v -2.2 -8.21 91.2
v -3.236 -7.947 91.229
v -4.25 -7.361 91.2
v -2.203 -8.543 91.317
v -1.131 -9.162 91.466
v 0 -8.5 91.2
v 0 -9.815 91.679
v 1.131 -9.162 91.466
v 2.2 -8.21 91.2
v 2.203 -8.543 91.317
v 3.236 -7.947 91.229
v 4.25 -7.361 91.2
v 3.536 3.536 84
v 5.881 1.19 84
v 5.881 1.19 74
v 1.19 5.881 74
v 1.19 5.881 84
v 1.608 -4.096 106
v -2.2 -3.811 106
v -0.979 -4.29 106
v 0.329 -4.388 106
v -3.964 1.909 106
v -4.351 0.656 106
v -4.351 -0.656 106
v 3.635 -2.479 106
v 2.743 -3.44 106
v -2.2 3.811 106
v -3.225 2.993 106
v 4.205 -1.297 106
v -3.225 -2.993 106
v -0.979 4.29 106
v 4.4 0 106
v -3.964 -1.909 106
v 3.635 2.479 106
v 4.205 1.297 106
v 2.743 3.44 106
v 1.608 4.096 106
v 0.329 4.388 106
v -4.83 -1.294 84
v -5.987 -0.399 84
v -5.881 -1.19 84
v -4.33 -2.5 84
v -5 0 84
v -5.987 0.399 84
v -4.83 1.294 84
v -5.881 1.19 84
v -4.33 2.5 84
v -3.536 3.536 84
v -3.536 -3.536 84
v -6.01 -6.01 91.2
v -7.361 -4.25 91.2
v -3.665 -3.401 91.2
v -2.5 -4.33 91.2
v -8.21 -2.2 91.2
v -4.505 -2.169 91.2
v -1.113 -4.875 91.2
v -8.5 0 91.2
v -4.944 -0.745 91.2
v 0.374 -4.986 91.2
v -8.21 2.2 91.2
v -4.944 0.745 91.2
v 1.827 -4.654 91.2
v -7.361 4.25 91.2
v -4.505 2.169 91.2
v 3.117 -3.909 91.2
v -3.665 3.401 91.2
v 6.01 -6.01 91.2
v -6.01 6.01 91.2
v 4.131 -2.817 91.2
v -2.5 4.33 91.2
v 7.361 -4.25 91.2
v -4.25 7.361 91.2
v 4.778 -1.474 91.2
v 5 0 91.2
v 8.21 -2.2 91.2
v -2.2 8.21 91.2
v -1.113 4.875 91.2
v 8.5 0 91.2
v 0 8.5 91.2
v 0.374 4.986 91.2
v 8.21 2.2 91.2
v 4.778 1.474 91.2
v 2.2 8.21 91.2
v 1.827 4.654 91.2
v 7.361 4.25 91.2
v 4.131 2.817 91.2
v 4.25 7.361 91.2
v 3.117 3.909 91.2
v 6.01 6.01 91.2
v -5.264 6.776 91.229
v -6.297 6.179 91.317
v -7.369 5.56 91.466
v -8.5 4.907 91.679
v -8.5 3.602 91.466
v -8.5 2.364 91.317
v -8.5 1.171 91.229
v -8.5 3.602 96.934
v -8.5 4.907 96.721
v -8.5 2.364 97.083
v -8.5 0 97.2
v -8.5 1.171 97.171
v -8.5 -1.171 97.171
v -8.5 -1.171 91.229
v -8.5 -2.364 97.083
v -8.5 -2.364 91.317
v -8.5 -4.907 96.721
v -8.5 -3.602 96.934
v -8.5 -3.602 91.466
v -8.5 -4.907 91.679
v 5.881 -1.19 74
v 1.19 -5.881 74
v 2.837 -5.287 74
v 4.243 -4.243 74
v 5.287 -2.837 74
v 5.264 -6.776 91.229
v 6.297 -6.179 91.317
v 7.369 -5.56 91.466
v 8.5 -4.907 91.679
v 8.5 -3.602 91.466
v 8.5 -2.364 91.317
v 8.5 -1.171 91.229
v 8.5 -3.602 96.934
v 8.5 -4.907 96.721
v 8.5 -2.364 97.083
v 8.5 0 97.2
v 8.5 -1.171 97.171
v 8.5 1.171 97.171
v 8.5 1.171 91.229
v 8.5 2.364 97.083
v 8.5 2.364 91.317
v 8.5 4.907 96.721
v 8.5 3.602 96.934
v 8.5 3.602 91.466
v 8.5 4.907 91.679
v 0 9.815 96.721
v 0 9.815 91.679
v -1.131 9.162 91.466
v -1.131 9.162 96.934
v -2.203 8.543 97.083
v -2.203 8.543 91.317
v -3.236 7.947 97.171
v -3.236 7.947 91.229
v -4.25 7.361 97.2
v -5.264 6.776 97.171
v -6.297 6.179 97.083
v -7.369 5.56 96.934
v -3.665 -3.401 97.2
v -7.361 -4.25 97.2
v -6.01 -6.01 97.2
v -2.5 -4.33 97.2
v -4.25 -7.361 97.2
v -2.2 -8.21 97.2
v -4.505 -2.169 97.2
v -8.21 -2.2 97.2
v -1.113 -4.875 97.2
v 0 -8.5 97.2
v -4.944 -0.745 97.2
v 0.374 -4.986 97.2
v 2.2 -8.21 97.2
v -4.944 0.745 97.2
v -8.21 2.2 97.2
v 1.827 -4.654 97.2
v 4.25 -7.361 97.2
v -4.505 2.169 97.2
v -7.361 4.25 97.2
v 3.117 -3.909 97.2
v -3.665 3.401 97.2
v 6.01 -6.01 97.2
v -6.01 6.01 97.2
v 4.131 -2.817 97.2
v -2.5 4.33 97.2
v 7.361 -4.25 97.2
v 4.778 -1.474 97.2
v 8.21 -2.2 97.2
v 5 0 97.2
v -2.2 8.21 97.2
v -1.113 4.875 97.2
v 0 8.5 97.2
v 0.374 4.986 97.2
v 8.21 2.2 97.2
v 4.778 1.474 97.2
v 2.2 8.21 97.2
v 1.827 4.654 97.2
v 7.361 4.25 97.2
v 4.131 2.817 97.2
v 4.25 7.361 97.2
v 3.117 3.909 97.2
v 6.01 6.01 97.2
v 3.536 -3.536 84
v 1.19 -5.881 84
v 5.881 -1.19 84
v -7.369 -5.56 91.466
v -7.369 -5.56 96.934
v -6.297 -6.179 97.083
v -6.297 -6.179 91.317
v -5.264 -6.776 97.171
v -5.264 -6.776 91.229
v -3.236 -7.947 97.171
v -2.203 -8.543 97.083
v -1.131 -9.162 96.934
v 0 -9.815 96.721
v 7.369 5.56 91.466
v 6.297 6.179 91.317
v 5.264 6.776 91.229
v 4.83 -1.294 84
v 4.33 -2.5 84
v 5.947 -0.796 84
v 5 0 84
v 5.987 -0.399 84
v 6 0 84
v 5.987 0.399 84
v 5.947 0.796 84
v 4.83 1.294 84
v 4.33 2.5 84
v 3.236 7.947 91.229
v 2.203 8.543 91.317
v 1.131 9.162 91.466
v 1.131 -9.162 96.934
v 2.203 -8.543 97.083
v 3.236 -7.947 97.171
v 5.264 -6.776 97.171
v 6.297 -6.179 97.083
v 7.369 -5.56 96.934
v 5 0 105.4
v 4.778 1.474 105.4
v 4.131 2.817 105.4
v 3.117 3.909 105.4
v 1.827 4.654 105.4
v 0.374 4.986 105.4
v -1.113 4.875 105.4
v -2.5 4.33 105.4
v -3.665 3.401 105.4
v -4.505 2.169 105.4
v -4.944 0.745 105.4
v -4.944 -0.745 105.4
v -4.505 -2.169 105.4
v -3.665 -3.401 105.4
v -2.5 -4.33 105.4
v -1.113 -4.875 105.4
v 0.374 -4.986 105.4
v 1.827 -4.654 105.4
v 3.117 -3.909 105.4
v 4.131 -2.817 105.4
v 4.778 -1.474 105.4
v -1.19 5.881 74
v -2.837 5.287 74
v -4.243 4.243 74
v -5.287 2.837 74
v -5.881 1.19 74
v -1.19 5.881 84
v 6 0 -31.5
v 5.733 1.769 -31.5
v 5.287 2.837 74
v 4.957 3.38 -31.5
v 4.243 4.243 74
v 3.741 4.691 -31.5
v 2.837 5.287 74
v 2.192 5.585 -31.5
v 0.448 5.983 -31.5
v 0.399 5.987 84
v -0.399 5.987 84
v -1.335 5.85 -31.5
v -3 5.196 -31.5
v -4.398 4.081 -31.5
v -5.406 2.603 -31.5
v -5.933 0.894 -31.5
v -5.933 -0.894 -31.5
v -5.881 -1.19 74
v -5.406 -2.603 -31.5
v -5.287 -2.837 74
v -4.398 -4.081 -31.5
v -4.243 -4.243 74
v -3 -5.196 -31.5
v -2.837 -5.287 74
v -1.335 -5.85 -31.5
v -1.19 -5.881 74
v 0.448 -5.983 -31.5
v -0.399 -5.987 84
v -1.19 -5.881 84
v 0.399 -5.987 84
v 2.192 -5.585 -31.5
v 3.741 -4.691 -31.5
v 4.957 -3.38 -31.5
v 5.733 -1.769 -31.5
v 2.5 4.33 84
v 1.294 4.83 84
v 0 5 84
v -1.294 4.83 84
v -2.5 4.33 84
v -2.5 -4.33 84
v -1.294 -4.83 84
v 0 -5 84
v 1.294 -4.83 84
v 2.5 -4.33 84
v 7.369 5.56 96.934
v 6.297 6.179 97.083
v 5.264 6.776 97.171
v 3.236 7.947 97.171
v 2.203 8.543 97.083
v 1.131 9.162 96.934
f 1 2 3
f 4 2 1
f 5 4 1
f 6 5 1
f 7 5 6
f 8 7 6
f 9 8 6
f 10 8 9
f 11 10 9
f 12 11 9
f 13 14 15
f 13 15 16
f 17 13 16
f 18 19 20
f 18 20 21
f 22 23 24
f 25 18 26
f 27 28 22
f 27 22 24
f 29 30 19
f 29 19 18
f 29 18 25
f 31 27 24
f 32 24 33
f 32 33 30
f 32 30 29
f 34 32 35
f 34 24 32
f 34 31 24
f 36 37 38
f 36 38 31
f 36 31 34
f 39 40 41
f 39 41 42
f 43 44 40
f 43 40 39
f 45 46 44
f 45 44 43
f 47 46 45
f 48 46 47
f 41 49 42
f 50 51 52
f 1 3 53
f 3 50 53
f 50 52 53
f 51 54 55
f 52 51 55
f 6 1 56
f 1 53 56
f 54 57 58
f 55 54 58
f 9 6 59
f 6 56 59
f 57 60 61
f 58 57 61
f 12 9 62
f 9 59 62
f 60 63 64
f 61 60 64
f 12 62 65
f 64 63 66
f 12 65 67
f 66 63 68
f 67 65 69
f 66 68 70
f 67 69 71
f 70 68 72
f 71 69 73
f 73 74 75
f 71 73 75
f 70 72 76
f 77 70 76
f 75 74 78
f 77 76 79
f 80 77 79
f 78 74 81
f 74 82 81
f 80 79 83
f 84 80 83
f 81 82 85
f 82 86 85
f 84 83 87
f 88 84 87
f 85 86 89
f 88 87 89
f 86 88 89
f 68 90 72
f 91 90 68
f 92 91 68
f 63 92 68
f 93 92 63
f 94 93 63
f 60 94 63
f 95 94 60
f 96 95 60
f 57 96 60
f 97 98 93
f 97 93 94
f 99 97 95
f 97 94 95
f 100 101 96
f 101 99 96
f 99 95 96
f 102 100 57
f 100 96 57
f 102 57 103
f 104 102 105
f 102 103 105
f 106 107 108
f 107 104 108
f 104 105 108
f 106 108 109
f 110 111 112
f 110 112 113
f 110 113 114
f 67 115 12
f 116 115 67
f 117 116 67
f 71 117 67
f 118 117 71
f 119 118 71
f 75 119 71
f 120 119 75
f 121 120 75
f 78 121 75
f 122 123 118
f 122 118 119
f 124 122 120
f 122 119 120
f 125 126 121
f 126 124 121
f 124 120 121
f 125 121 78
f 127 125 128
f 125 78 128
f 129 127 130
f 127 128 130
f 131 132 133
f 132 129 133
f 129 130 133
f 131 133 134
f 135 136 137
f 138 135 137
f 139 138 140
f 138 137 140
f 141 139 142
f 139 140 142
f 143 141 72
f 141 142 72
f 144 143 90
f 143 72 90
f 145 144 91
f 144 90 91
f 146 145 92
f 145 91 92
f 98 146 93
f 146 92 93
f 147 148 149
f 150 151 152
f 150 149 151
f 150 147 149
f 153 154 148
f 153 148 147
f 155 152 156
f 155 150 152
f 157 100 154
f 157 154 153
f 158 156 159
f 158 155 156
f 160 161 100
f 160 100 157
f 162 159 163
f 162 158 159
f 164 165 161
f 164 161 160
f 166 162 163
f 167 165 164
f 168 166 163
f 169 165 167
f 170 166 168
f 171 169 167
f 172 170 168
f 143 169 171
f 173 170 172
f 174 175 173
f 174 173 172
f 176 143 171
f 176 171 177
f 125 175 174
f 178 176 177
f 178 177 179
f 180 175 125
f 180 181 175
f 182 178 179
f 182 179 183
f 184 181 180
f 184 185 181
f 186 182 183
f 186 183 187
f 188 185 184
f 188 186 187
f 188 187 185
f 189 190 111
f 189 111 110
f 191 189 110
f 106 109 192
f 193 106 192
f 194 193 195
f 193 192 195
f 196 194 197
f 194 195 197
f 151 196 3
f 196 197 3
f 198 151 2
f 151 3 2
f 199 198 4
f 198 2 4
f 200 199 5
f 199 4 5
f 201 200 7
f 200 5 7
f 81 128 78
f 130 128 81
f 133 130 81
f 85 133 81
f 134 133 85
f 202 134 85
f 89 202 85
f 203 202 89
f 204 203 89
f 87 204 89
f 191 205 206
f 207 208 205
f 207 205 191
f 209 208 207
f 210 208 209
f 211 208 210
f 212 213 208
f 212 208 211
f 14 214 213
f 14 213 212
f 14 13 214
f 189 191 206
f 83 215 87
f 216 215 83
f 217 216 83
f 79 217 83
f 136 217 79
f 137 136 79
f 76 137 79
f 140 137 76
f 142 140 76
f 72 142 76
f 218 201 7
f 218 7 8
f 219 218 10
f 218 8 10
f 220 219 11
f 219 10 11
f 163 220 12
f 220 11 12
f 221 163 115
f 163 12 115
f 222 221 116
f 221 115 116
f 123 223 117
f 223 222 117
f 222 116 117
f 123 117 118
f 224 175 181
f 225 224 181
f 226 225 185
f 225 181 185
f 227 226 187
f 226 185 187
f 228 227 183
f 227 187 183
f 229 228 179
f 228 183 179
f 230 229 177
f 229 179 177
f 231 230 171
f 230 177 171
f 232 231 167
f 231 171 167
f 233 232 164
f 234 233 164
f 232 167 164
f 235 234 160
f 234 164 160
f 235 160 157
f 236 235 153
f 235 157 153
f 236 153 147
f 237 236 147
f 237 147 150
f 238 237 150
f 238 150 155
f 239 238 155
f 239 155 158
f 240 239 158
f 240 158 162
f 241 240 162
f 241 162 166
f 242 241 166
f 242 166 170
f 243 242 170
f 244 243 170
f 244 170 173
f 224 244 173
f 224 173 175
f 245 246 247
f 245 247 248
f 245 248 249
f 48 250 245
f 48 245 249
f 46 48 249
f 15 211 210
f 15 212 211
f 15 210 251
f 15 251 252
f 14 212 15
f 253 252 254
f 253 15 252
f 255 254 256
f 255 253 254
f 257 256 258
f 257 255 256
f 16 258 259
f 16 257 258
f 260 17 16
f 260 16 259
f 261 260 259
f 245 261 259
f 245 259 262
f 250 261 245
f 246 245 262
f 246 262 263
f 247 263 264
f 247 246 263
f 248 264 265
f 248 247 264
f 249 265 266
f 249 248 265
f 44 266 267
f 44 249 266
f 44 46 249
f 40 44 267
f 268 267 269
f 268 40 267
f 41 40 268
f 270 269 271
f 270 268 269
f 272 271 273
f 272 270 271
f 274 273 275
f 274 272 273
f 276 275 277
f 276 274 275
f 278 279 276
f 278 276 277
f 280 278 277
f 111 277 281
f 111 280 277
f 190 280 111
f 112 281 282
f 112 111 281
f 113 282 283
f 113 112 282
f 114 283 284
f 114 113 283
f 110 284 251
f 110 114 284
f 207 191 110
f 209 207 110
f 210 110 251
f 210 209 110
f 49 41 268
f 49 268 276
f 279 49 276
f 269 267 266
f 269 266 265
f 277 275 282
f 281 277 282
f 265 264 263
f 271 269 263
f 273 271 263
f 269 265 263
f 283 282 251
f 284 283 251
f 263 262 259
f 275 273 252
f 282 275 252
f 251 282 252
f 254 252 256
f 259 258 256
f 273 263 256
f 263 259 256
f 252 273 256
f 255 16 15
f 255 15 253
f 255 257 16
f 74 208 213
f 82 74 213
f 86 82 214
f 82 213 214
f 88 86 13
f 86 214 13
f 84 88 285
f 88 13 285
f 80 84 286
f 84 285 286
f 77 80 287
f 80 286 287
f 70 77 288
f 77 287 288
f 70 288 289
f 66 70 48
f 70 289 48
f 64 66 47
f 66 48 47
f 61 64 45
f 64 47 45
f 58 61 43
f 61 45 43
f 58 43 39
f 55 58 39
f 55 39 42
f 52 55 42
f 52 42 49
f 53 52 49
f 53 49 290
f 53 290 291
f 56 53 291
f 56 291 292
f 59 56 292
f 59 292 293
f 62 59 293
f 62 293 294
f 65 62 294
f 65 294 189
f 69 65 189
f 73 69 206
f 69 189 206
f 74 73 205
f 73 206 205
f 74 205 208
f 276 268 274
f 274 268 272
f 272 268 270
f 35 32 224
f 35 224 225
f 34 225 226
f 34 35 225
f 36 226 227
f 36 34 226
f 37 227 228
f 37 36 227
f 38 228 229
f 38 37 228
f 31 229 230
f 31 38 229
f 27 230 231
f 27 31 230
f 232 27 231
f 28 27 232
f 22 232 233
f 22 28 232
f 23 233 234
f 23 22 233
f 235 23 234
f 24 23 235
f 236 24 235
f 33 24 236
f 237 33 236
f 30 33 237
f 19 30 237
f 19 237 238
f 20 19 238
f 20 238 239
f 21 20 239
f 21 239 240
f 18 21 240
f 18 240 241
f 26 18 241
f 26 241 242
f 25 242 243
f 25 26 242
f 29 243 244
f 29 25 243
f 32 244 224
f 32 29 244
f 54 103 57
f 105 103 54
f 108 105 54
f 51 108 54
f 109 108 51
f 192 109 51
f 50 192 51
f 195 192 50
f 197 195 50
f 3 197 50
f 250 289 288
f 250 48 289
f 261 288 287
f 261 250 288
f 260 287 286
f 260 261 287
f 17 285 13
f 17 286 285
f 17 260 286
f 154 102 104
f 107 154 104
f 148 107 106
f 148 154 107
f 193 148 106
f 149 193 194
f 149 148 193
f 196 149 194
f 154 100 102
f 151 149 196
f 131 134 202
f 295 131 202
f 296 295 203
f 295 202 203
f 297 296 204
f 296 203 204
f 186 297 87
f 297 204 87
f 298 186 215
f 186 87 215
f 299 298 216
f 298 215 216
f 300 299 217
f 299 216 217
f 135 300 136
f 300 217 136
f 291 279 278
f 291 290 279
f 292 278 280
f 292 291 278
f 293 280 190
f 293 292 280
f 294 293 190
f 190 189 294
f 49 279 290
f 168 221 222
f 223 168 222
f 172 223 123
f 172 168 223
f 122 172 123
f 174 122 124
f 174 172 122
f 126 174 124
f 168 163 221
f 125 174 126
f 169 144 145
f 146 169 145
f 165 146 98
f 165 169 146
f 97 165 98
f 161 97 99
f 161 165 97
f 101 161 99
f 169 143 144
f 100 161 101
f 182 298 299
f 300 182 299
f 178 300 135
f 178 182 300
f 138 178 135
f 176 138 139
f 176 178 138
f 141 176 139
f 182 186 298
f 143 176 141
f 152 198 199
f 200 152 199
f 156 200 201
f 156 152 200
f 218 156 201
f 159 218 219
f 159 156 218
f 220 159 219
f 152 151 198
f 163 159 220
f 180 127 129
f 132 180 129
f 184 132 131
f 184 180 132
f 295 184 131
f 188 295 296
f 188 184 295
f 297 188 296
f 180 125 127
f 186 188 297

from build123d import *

# Parameters (mm, degrees)
EXTRUDE_START       = 84
SKETCH_3_R          = 6
EXTRUDE_1_DEPTH     = 115.5
SKETCH_4_R          = 5
EXTRUDE_2_DEPTH     = 22
EXTRUDE_START_2     = 91.2
EXTRUDE_3_DEPTH     = 6
SKETCH_6_OUTSIDE_W  = 46.986
SKETCH_6_OUTSIDE_H  = 49.616
CUT_EXTRUDE_1_DEPTH = 10
CHAMFER_1_SIZE      = 0.6


with BuildPart() as part:
    # 草图3 → 凸台-拉伸1 (new body)
    with BuildSketch(Plane.XY.offset(EXTRUDE_START)):
        Circle(SKETCH_3_R)
    extrude(amount=-EXTRUDE_1_DEPTH)

    # 草图4 → 凸台-拉伸2 (add)
    with BuildSketch(Plane.XY.offset(84)):
        Circle(SKETCH_4_R)
    extrude(amount=EXTRUDE_2_DEPTH)

    # 草图5 → 凸台-拉伸3 (add)
    with BuildSketch(Plane.XY.offset(EXTRUDE_START_2)):
        Polygon((0, -9.814954576), (8.5, -4.907477288), (8.5, 4.907477288), (0, 9.814954576), (-8.5, 4.907477288), (-8.5, -4.907477288), align=None)
    extrude(amount=EXTRUDE_3_DEPTH)

    # 草图7 → 切除-旋转2 (revolve, cut)
    with BuildSketch(Plane(origin=(0, 0, 0), x_dir=(0, 0, -1), z_dir=(0, 1, 0))):
        Polygon((-97.2, 8.5), (-97.2, 18.742432258), (-91.2, 18.742432258), (-91.2, 8.5), (-94.2, 16.742432258), align=None)
    revolve(axis=Axis((0, 0, 84), (0, 0, 1)), mode=Mode.SUBTRACT)

    # 草图6 outside → 切除-拉伸1 (cut)
    with BuildSketch(Plane.XY.offset(84)):
        Rectangle(SKETCH_6_OUTSIDE_W, SKETCH_6_OUTSIDE_H)
        Polygon((0, -7.071067812), (7.071067812, 0), (0, 7.071067812), (-7.071067812, 0), align=None, mode=Mode.SUBTRACT)
    extrude(amount=-CUT_EXTRUDE_1_DEPTH, mode=Mode.SUBTRACT)

    # 倒角1
    chamfer_1_edges = [part.edges().sort_by_distance(p)[0] for p in [
        (-5, 0, 106),
    ]]
    chamfer(chamfer_1_edges, length=CHAMFER_1_SIZE)


solid = part.part
